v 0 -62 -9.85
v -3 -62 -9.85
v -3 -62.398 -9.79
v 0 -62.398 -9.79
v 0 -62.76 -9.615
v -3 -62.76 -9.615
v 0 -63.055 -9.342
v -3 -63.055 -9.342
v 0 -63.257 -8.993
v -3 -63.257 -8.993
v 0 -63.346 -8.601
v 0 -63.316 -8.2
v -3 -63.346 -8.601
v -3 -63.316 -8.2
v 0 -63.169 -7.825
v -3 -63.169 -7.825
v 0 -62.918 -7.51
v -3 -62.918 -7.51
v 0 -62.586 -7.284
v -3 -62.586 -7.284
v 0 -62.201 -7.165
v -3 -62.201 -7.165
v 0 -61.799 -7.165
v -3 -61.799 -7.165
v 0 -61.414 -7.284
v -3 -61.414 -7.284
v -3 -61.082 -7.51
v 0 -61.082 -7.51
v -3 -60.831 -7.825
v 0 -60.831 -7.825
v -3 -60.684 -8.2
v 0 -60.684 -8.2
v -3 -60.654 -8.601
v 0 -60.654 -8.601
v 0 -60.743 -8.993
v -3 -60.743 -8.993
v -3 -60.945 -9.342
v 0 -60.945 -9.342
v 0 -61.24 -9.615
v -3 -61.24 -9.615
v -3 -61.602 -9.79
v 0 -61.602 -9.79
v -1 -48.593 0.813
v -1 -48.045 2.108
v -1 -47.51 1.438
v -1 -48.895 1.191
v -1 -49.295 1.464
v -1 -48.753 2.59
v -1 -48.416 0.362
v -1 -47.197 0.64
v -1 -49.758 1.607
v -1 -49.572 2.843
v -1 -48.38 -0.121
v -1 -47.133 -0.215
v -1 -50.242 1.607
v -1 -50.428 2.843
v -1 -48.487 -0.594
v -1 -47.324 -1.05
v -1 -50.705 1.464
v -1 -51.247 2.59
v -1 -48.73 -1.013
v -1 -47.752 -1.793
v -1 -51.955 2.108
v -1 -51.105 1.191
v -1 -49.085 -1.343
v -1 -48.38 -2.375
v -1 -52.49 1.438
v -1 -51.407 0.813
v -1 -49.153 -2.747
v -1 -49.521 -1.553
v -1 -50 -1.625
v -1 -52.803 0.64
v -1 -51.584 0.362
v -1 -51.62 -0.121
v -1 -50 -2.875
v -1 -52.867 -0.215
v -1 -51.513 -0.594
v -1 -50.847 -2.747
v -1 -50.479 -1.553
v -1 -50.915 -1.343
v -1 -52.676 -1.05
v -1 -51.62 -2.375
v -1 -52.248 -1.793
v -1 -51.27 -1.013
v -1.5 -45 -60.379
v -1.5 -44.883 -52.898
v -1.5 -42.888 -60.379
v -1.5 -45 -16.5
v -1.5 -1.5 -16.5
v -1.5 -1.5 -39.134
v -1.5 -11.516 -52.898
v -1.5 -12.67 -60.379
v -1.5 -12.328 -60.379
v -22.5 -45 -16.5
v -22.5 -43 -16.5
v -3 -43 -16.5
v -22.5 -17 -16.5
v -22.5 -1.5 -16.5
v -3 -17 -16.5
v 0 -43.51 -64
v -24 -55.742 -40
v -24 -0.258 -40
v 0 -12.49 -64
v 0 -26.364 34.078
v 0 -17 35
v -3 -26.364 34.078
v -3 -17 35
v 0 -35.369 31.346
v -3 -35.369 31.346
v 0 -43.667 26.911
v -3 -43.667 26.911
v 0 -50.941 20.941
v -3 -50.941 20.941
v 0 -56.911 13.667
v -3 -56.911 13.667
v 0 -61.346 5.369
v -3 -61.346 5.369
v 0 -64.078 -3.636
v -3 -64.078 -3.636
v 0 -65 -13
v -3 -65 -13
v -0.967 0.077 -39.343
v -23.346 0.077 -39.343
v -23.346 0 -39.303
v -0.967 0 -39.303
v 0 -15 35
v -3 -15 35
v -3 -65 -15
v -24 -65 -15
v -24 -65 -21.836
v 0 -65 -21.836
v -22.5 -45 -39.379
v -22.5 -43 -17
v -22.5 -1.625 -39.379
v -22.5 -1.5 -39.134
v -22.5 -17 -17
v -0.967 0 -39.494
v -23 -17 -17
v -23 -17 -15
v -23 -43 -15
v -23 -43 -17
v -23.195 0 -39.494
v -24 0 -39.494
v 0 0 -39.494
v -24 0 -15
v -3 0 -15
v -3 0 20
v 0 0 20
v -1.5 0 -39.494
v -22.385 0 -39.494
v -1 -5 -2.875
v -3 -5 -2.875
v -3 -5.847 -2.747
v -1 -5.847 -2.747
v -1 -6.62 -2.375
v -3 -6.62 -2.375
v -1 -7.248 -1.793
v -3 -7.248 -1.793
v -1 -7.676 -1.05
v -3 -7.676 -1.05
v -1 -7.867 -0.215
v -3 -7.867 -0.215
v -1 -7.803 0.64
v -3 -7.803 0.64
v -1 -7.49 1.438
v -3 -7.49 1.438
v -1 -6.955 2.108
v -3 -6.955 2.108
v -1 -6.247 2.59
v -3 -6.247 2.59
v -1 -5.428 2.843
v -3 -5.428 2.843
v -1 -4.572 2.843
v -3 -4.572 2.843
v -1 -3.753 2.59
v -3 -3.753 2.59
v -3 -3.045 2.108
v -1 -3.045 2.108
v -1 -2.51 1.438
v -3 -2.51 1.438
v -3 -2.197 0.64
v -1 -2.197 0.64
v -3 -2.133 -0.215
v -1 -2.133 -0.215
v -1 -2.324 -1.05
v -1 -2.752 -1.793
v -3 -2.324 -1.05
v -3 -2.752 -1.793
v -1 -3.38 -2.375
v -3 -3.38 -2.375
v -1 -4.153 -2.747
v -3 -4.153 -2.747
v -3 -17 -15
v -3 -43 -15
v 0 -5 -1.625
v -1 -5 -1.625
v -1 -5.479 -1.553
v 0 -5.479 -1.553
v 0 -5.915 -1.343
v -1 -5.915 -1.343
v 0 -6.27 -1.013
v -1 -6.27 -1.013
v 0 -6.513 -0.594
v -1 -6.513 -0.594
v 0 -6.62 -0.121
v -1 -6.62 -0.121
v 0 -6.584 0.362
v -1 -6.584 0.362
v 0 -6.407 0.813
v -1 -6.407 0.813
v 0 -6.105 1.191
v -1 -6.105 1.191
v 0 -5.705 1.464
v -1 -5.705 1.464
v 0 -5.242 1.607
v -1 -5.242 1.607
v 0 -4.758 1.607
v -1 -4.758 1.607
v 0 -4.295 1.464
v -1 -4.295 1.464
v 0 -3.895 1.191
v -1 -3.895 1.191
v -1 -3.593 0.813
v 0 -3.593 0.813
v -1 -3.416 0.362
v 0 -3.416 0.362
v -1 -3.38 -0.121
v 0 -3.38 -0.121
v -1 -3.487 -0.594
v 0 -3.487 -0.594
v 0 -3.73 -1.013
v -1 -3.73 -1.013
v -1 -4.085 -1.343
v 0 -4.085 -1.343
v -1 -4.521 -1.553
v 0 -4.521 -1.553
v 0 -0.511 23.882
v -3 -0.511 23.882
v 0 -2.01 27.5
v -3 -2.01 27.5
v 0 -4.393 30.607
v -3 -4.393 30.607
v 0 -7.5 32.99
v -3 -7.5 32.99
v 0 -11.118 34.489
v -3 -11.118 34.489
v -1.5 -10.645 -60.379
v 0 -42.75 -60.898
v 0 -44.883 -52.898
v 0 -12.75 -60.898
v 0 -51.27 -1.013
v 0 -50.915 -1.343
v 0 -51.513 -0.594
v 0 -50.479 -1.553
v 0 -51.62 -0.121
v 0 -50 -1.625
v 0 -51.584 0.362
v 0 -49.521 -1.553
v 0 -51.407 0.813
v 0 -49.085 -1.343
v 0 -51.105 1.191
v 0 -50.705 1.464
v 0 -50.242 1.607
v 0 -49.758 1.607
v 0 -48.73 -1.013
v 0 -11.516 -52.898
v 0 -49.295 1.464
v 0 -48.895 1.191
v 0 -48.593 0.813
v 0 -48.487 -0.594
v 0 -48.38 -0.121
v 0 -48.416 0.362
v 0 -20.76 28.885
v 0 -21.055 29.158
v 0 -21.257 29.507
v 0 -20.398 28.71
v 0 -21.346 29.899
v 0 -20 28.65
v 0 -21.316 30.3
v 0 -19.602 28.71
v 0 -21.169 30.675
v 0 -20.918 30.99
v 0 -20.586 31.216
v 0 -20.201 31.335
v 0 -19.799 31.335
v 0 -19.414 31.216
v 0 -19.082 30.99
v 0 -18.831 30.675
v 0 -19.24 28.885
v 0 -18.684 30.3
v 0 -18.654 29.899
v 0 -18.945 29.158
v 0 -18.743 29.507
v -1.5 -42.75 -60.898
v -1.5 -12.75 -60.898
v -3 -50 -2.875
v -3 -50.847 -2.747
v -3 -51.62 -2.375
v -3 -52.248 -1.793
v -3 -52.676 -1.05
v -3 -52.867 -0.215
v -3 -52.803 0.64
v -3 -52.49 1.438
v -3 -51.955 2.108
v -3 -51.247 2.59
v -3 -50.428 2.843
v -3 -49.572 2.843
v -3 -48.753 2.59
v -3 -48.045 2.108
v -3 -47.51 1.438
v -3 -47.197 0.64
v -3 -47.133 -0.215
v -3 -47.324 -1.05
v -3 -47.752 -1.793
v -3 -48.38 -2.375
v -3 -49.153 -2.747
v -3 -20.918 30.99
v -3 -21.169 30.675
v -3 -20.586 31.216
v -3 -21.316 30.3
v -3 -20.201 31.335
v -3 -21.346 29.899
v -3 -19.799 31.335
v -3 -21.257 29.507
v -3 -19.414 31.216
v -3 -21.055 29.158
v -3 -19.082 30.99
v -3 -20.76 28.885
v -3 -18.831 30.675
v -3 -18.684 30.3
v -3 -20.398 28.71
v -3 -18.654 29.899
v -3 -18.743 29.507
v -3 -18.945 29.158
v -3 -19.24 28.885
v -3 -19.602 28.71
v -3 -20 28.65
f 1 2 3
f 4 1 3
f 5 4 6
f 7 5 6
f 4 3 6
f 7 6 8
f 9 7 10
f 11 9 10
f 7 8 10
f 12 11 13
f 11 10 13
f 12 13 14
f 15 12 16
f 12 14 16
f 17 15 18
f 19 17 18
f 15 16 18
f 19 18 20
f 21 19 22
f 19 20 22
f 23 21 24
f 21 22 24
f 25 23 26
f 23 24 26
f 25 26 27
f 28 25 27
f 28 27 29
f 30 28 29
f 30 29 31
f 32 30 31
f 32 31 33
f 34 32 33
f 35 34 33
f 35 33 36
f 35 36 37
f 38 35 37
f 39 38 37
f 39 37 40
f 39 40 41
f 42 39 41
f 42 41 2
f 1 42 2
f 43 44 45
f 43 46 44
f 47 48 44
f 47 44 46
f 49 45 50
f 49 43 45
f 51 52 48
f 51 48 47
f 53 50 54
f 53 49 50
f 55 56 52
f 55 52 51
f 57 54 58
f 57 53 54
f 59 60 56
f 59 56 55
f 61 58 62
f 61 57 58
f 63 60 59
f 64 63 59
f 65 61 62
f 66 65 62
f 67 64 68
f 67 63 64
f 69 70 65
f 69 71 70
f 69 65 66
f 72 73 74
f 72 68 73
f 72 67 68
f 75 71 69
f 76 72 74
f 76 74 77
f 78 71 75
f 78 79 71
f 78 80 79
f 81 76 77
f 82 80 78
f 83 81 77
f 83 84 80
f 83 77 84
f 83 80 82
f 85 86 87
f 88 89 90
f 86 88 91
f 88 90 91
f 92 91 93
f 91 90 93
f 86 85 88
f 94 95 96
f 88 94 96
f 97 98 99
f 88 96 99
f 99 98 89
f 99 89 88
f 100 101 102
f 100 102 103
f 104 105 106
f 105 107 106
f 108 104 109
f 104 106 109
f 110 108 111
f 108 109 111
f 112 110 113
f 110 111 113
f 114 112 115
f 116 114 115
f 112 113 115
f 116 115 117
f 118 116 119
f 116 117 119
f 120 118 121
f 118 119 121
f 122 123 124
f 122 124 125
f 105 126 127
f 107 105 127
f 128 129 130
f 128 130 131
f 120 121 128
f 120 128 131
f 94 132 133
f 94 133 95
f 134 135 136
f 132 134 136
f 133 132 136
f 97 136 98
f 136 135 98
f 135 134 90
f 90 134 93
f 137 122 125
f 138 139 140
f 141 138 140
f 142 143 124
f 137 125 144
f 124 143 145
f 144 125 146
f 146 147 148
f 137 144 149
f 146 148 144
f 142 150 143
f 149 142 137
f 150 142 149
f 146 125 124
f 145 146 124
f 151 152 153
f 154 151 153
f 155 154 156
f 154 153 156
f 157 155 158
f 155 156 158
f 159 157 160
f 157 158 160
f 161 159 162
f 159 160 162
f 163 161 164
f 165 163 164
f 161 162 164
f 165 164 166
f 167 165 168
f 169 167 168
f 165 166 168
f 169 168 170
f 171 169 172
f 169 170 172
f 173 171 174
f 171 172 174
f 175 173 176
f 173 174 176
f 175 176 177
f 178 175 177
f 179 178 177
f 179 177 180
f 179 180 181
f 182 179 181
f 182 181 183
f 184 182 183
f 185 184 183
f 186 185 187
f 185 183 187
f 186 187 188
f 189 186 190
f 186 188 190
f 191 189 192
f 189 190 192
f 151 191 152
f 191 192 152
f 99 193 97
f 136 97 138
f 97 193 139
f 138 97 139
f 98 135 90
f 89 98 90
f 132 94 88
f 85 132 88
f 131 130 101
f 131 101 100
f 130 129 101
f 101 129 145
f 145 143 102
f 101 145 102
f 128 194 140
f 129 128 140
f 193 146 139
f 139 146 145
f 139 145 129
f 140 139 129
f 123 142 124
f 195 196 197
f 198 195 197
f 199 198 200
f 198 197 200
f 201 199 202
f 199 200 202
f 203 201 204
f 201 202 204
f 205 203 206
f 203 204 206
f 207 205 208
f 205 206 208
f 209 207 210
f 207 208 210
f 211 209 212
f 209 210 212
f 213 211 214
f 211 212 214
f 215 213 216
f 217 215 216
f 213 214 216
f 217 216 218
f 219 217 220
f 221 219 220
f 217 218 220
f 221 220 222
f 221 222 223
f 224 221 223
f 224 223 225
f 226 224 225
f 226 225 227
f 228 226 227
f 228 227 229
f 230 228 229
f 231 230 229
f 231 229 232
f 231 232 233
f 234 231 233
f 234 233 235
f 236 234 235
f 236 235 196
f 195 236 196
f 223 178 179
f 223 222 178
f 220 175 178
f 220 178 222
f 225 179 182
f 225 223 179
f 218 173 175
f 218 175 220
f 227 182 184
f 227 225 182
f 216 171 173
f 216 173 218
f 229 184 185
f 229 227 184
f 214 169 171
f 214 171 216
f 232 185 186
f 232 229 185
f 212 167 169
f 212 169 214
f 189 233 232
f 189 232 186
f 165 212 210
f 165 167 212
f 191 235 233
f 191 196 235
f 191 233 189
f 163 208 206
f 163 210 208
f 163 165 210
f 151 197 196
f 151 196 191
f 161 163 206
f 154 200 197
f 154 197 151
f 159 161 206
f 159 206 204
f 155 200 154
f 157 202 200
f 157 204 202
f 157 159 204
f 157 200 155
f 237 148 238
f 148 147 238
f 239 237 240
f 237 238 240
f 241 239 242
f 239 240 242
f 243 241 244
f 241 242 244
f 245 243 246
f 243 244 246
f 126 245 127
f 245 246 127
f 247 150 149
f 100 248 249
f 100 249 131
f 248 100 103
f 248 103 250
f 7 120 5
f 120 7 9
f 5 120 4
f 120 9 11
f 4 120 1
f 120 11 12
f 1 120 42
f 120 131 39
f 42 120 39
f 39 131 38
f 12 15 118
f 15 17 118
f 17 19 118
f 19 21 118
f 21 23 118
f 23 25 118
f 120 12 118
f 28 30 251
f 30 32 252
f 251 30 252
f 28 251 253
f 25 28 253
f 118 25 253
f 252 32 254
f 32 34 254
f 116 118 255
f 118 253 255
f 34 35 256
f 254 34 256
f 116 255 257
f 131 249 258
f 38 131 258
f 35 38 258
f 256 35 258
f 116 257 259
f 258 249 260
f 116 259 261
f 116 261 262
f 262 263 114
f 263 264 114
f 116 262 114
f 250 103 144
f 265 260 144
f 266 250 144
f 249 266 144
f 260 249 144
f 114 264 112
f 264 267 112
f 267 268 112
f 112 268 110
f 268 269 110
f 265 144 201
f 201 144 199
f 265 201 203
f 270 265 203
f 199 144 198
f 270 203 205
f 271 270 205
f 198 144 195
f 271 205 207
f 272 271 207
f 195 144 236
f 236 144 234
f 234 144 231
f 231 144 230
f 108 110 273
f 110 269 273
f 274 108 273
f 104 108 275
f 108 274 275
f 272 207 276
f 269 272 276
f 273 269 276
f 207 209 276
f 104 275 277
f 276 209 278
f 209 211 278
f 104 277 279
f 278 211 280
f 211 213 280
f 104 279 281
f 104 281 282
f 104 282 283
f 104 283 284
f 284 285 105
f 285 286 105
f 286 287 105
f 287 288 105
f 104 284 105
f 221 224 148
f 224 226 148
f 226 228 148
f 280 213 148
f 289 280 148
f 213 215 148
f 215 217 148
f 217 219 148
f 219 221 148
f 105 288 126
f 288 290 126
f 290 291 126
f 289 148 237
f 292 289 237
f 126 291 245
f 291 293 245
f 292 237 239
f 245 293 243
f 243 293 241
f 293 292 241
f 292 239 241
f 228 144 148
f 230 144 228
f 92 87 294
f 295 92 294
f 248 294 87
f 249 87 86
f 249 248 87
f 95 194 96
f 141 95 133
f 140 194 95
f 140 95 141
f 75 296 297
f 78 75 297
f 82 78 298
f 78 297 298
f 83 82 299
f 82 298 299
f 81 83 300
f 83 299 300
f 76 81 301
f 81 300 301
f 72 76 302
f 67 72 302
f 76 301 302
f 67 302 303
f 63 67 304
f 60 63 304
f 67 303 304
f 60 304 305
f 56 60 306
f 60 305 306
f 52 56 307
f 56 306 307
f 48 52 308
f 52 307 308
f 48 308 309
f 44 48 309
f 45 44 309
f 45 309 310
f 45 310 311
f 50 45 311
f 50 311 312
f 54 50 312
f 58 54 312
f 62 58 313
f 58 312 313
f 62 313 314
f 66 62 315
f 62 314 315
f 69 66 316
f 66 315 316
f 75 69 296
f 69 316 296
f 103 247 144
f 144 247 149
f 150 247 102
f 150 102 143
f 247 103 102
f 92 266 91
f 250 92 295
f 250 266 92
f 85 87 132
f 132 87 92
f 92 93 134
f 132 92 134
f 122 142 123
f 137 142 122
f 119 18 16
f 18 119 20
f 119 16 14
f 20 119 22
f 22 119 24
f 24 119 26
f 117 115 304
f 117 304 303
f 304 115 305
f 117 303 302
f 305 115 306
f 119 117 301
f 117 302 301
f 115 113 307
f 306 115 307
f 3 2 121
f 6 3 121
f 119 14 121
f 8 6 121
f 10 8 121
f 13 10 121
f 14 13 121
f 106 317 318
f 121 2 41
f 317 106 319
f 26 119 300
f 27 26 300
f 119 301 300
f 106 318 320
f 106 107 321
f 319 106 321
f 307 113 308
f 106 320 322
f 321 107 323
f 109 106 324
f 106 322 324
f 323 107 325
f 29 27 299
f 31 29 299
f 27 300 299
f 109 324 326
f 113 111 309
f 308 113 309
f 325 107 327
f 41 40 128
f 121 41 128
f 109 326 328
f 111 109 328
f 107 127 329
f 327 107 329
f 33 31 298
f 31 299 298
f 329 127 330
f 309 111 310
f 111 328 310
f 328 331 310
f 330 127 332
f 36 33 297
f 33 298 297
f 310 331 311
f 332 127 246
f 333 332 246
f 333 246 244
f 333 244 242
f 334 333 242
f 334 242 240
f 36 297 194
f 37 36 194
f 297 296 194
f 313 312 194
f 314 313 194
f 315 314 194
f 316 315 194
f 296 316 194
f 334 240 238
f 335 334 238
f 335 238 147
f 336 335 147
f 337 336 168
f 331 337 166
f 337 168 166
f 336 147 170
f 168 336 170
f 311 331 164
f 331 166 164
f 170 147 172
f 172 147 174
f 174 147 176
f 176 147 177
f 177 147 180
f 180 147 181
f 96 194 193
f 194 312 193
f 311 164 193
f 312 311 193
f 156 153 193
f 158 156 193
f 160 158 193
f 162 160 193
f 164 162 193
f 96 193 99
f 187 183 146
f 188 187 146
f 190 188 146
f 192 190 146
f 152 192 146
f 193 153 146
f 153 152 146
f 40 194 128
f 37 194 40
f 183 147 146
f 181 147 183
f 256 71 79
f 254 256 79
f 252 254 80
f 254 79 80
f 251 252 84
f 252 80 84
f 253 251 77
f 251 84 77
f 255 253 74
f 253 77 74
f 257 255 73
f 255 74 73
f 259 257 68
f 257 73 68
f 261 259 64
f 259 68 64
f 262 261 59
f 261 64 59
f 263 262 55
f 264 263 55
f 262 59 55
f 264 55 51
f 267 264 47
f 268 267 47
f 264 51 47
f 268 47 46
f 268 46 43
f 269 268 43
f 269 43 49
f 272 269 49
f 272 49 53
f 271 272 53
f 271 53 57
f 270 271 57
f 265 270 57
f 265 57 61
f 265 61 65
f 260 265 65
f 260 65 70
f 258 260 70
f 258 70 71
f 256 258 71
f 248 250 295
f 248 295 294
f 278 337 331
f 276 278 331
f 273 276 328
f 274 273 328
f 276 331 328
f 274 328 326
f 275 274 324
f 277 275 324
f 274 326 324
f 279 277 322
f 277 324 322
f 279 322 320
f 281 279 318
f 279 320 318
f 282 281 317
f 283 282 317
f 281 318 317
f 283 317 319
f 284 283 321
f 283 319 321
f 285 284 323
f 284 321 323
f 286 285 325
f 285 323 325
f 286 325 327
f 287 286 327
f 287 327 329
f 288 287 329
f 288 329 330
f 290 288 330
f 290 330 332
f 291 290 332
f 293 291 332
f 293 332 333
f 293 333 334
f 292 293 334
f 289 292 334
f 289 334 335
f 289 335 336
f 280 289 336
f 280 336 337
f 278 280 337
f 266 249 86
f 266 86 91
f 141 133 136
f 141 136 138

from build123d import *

# Parameters (mm, degrees)
PAD_DEPTH       = 65
SKETCH052_R     = 1.625
POCKET_DEPTH    = 5
SKETCH053_R     = 2.875
POCKET001_DEPTH = 2
SKETCH054_R     = 1.35
POCKET002_DEPTH = 5
SKETCH055_W     = 20
SKETCH055_H     = 26
POCKET003_DEPTH = 2
POCKET004_DEPTH = 24.001
POCKET005_DEPTH = 45
SKETCH058_W     = 22.635606
SKETCH058_H     = 23.579969
PAD001_DEPTH    = 1.5
PAD002_DEPTH    = 1.5
POCKET006_DEPTH = 1.5
FILLET_R        = 15
FILLET001_R     = 48


with BuildPart() as part:
    # Sketch → Pad (new body)
    with BuildSketch(Plane.XZ):
        Polygon((0, -64), (0, 35), (-3, 35), (-3, -15), (-24, -15), (-24, -40), align=None)
    extrude(amount=PAD_DEPTH)

    # Sketch052 (on Face3 of Pad) → Pocket (cut)
    with BuildSketch(Plane(origin=(-3, 0, 0), x_dir=(0, 0, -1), z_dir=(-1, 0, 0))):
        with Locations((0, 5)):
            Circle(SKETCH052_R)
        with Locations((0, 50)):
            Circle(SKETCH052_R)
    extrude(amount=-POCKET_DEPTH, mode=Mode.SUBTRACT)

    # Sketch053 (on Face9 of Pocket) → Pocket001 (cut)
    with BuildSketch(Plane(origin=(-3, 0, 0), x_dir=(0, 0, -1), z_dir=(-1, 0, 0))):
        with Locations((0, 50)):
            Circle(SKETCH053_R)
        with Locations((0, 5)):
            Circle(SKETCH053_R)
    extrude(amount=-POCKET001_DEPTH, mode=Mode.SUBTRACT)

    # Sketch054 (on Face9 of Pocket001) → Pocket002 (cut)
    with BuildSketch(Plane(origin=(-3, 0, 0), x_dir=(0, 0, -1), z_dir=(-1, 0, 0))):
        with Locations((8.5, 62)):
            Circle(SKETCH054_R)
        with Locations((-30, 20)):
            Circle(SKETCH054_R)
    extrude(amount=-POCKET002_DEPTH, mode=Mode.SUBTRACT)

    # Sketch055 (on Face12 of Pocket002) → Pocket003 (cut)
    with BuildSketch(Plane(origin=(0, 0, -15), x_dir=(-1, 0, 0), z_dir=(0, 0, 1))):
        with Locations((13, 30)):
            Rectangle(SKETCH055_W, SKETCH055_H)
    extrude(amount=-POCKET003_DEPTH, mode=Mode.SUBTRACT)

    # Sketch056 (on Face10 of Pocket003) → Pocket004 (cut, through all)
    with BuildSketch(Plane(origin=(-24, 0, 0), x_dir=(0, 0, -1), z_dir=(-1, 0, 0))):
        Polygon((20, 65.935591), (65, 43), (65, 13), (20, -9.935591), (140.441742, -9.935591), (140.441742, 74.581261), align=None)
    extrude(amount=-POCKET004_DEPTH, mode=Mode.SUBTRACT)

    # Sketch057 (on Face3 of Pocket004) → Pocket005 (cut)
    with BuildSketch(Plane(origin=(0, 0, 0), x_dir=(1, 0, 0), z_dir=(0, 1, 0))):
        Polygon((-22.5, 16.5), (-1.5, 16.5), (-1.5, 60.37868), (-22.5, 39.37868), align=None)
    extrude(amount=-POCKET005_DEPTH, mode=Mode.SUBTRACT)

    # Sketch058 (on Face3 of Pocket005) → Pad001 (join)
    with BuildSketch(Plane(origin=(0, 0, 0), x_dir=(1, 0, 0), z_dir=(0, 1, 0))):
        with Locations((-12.082939, 27.703805)):
            Rectangle(SKETCH058_W, SKETCH058_H)
    extrude(amount=-PAD001_DEPTH)

    # Sketch059 (on Face2 of Pad001) → Pad002 (join)
    with BuildSketch(Plane(origin=(0, 15.978418, -8.143877), x_dir=(1, 0, 0), z_dir=(0, 0.890951, -0.4541))):
        Polygon((-0.967459, 35.017357), (-0.967459, 60.181422), (-23.34556, 35.017357), align=None)
    extrude(amount=-PAD002_DEPTH)

    # Sketch060 (on Face1 of Pad002) → Pocket006 (cut)
    with BuildSketch(Plane(origin=(0, 0, 0), x_dir=(0, 0, 1), z_dir=(1, 0, 0))):
        Polygon((-60.897689, 42.750073), (-52.897689, 44.883326), (-52.897689, 11.516028), (-60.897689, 12.750073), align=None)
    extrude(amount=-POCKET006_DEPTH, mode=Mode.SUBTRACT)

    # Fillet
    fillet_edges = [part.edges().sort_by_distance(p)[0] for p in [
        (-1.5, 0, 35),
    ]]
    fillet(fillet_edges, radius=FILLET_R)

    # Fillet001
    fillet001_edges = [part.edges().sort_by_distance(p)[0] for p in [
        (-1.5, -65, 35),
    ]]
    fillet(fillet001_edges, radius=FILLET001_R)


solid = part.part
